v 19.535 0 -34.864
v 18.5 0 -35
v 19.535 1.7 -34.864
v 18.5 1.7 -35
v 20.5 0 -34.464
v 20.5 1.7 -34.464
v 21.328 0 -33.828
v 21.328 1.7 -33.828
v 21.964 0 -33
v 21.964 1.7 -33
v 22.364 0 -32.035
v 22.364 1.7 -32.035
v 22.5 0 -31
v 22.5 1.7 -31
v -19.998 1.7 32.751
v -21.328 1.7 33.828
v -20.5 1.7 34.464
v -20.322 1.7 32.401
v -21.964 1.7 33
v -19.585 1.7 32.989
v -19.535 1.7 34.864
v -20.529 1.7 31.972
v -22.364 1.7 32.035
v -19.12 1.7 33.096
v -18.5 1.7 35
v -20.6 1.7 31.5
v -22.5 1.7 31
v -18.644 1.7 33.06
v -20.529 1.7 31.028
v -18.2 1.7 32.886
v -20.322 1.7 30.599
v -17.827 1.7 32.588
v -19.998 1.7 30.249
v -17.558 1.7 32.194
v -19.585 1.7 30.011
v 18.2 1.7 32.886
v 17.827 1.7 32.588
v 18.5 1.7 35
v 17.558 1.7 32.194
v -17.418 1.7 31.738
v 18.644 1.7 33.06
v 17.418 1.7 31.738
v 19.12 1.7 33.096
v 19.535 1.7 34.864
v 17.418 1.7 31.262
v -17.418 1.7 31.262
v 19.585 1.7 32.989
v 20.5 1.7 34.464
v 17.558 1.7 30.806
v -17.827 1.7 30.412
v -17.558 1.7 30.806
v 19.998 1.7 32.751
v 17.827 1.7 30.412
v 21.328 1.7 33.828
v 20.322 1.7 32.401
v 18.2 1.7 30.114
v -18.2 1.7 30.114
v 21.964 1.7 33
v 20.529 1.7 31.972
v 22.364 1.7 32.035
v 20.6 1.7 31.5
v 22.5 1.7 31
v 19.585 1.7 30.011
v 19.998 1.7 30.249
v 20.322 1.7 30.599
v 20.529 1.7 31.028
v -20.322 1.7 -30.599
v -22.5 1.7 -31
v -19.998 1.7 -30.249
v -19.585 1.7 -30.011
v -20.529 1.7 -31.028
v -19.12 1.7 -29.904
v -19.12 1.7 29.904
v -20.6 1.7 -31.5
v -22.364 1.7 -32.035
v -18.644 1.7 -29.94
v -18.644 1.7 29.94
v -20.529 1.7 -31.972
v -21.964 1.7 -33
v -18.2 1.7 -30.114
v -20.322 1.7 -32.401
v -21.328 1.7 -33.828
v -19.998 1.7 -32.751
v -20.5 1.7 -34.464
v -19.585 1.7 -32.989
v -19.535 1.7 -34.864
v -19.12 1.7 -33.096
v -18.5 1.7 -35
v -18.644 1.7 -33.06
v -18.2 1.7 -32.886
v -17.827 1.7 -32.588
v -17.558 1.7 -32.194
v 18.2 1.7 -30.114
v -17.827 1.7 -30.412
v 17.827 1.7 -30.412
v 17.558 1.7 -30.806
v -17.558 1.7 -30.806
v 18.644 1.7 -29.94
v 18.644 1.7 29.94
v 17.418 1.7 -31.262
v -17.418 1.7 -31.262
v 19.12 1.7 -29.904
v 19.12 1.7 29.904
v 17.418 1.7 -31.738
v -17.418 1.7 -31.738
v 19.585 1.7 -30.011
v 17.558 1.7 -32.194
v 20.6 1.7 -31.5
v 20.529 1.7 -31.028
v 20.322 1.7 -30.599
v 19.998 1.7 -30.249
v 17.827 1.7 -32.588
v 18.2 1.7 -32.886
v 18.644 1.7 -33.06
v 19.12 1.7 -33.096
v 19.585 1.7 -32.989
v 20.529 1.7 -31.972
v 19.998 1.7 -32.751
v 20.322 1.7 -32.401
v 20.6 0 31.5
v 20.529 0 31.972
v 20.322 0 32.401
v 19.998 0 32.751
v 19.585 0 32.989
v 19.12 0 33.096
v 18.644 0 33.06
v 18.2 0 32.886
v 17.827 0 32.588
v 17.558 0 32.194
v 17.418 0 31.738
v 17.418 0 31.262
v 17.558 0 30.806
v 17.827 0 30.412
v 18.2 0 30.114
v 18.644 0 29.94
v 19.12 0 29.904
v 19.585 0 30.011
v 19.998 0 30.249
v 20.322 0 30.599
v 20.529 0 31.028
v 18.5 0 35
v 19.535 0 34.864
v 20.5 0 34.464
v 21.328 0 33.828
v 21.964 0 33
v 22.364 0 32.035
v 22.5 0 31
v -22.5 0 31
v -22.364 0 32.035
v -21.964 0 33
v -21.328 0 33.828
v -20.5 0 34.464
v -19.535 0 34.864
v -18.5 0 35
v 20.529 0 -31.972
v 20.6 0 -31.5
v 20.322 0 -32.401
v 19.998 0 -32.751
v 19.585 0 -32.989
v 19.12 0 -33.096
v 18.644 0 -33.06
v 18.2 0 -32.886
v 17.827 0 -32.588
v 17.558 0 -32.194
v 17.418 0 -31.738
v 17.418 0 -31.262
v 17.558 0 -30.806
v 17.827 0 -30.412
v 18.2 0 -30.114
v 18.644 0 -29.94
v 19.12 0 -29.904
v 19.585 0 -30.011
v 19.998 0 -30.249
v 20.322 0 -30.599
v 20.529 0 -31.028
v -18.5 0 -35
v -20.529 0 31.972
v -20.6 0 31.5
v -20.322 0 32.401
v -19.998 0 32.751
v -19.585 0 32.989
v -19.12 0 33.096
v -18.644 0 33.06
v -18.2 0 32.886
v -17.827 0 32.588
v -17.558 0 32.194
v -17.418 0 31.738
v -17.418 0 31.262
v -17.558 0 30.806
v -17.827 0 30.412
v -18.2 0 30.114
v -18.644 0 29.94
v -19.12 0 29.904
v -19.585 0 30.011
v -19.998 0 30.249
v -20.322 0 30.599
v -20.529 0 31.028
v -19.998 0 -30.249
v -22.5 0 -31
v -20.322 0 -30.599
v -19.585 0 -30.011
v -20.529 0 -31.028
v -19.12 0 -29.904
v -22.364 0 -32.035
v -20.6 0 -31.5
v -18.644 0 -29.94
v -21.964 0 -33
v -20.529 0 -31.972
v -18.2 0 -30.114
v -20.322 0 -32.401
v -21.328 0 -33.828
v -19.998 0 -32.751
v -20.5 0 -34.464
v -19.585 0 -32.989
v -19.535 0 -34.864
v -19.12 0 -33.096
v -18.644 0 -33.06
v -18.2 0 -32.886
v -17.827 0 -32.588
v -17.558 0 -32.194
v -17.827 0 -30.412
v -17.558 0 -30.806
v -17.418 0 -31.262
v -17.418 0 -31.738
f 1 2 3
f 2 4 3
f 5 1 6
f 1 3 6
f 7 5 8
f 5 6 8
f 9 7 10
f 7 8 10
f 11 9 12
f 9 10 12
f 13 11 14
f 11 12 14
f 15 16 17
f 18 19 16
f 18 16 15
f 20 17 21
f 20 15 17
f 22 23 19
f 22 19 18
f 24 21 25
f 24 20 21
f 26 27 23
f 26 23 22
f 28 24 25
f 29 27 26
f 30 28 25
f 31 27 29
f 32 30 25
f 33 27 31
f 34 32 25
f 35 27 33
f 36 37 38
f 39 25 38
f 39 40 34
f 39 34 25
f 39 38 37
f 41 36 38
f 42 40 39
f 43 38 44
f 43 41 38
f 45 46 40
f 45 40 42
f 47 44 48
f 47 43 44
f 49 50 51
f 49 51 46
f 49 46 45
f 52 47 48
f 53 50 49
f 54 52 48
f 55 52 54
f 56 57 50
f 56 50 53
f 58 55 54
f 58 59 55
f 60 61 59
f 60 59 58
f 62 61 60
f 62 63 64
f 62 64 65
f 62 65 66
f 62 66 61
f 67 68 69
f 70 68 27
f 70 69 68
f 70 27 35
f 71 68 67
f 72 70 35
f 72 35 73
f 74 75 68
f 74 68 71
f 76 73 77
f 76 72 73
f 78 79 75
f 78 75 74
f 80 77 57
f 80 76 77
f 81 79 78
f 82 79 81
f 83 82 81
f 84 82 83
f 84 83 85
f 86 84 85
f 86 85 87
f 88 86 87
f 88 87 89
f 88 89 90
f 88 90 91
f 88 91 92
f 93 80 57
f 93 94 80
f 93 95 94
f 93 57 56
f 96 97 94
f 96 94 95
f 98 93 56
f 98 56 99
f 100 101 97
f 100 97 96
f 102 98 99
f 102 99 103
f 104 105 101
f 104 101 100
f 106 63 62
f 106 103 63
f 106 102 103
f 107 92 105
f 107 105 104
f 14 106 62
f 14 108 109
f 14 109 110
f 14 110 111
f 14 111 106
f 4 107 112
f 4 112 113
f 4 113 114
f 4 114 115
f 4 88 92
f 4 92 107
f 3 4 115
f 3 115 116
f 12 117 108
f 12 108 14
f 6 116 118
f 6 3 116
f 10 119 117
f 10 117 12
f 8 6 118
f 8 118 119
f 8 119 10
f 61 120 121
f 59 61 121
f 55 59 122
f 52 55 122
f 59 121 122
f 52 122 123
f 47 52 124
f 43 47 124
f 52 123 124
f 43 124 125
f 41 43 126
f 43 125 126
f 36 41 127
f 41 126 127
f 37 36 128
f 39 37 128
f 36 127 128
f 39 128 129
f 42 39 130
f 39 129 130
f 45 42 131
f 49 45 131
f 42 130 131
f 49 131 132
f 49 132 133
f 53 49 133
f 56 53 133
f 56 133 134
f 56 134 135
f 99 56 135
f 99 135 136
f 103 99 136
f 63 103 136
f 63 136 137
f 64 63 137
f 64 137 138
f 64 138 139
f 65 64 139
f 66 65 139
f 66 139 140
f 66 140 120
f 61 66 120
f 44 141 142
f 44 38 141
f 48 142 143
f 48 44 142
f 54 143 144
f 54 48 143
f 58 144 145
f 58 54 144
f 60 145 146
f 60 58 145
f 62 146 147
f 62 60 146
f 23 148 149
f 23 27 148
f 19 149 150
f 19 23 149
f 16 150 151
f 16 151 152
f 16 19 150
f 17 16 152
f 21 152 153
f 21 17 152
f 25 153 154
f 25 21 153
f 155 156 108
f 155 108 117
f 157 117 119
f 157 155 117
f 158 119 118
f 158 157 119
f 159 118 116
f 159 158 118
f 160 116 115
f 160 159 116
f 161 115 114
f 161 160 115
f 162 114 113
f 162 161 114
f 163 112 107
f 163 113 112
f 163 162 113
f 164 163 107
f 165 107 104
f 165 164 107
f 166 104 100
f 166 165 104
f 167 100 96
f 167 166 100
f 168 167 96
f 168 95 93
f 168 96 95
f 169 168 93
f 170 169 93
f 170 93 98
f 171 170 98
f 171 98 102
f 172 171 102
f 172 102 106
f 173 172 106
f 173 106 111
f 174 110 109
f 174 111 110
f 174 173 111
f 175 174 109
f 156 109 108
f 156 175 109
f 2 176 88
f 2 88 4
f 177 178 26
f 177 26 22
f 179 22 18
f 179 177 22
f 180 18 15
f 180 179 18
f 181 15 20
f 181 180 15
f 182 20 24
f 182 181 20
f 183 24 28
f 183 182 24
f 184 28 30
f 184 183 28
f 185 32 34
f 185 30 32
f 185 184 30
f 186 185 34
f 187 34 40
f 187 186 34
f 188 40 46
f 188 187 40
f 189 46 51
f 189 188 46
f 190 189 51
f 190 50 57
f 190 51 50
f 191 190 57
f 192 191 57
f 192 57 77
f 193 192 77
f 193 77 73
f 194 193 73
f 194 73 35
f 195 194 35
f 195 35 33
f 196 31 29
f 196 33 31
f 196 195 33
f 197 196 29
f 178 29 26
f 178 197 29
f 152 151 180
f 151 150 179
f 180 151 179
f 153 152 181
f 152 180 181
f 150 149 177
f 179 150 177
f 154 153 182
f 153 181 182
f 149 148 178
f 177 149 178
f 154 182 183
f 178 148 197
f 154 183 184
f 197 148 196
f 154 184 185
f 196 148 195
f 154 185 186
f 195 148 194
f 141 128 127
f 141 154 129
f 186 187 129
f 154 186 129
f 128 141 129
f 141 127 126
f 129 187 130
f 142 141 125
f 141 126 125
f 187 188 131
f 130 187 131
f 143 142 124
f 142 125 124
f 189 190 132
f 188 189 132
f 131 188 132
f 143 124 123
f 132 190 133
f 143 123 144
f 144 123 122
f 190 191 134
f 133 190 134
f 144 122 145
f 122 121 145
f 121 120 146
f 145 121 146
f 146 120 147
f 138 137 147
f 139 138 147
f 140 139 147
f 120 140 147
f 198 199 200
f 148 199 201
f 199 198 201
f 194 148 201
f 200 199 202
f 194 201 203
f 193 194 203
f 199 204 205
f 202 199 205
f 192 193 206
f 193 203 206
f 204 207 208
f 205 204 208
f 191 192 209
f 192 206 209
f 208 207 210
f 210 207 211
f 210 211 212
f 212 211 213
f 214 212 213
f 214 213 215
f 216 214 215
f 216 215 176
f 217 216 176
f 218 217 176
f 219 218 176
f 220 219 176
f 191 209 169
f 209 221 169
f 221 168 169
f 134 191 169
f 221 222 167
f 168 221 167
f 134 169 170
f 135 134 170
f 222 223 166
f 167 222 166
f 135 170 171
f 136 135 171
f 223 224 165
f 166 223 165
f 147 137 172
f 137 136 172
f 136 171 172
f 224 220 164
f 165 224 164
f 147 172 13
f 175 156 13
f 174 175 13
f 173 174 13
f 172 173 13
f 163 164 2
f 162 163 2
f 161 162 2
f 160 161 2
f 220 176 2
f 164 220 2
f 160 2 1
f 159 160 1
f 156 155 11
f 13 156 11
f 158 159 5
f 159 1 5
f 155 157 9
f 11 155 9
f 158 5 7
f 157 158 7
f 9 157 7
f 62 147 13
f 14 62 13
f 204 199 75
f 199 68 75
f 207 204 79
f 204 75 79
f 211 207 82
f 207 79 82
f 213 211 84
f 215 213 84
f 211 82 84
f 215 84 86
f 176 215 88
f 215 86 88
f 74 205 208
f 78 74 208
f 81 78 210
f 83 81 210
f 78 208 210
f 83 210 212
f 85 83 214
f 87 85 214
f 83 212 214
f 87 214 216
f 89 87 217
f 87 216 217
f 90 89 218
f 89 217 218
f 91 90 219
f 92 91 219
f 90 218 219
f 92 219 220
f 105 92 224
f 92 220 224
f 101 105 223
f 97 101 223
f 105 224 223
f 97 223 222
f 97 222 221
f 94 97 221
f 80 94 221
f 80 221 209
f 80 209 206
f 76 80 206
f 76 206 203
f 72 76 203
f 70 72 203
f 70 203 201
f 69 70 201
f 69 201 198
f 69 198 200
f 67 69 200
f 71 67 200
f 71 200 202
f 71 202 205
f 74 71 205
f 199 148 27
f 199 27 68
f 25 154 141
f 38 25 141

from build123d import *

# Parameters (mm, degrees)
SKETCH1_W            = 45
SKETCH1_H            = 70
MAIN_BODY_DEPTH      = 1.7
M3_CLEARANCE_HOLE1_D = 3.2
MIRROR2_COPY_1_D     = 3.2
FILLET1_R            = 4


with BuildPart() as part:
    # Sketch1 → MAIN BODY (new body)
    with BuildSketch(Plane(origin=(0, 0, 0), x_dir=(1, 0, 0), z_dir=(0, 1, 0))):
        Rectangle(SKETCH1_W, SKETCH1_H)
    extrude(amount=MAIN_BODY_DEPTH)

    # M3 Clearance Hole1 (through all)
    with Locations(Plane(origin=(0, 1.7, 0), x_dir=(1, 0, 0), z_dir=(0, 1, 0))):
        with Locations((-19, 31.5)):
            m3_clearance_hole1 = Hole(M3_CLEARANCE_HOLE1_D / 2)

    # Mirror1: M3 Clearance Hole1 across plane
    add(m3_clearance_hole1.mirror(Plane(origin=(0, 0, 0), x_dir=(0, 0, 1), z_dir=(1, 0, 0))), mode=Mode.SUBTRACT)

    # Mirror2: M3 Clearance Hole1 across plane
    add(m3_clearance_hole1.mirror(Plane.XY), mode=Mode.SUBTRACT)

    # Mirror2 copy 1 (through all)
    with Locations(Plane(origin=(0, 1.7, 0), x_dir=(-1, 0, 0), z_dir=(0, 1, 0))):
        with Locations((-19, 31.5)):
            Hole(MIRROR2_COPY_1_D / 2)

    # Fillet1
    fillet1_edges = [part.edges().sort_by_distance(p)[0] for p in [
        (22.5, 0.85, 35),
        (-22.5, 0.85, 35),
        (-22.5, 0.85, -35),
        (22.5, 0.85, -35),
    ]]
    fillet(fillet1_edges, radius=FILLET1_R)


solid = part.part
